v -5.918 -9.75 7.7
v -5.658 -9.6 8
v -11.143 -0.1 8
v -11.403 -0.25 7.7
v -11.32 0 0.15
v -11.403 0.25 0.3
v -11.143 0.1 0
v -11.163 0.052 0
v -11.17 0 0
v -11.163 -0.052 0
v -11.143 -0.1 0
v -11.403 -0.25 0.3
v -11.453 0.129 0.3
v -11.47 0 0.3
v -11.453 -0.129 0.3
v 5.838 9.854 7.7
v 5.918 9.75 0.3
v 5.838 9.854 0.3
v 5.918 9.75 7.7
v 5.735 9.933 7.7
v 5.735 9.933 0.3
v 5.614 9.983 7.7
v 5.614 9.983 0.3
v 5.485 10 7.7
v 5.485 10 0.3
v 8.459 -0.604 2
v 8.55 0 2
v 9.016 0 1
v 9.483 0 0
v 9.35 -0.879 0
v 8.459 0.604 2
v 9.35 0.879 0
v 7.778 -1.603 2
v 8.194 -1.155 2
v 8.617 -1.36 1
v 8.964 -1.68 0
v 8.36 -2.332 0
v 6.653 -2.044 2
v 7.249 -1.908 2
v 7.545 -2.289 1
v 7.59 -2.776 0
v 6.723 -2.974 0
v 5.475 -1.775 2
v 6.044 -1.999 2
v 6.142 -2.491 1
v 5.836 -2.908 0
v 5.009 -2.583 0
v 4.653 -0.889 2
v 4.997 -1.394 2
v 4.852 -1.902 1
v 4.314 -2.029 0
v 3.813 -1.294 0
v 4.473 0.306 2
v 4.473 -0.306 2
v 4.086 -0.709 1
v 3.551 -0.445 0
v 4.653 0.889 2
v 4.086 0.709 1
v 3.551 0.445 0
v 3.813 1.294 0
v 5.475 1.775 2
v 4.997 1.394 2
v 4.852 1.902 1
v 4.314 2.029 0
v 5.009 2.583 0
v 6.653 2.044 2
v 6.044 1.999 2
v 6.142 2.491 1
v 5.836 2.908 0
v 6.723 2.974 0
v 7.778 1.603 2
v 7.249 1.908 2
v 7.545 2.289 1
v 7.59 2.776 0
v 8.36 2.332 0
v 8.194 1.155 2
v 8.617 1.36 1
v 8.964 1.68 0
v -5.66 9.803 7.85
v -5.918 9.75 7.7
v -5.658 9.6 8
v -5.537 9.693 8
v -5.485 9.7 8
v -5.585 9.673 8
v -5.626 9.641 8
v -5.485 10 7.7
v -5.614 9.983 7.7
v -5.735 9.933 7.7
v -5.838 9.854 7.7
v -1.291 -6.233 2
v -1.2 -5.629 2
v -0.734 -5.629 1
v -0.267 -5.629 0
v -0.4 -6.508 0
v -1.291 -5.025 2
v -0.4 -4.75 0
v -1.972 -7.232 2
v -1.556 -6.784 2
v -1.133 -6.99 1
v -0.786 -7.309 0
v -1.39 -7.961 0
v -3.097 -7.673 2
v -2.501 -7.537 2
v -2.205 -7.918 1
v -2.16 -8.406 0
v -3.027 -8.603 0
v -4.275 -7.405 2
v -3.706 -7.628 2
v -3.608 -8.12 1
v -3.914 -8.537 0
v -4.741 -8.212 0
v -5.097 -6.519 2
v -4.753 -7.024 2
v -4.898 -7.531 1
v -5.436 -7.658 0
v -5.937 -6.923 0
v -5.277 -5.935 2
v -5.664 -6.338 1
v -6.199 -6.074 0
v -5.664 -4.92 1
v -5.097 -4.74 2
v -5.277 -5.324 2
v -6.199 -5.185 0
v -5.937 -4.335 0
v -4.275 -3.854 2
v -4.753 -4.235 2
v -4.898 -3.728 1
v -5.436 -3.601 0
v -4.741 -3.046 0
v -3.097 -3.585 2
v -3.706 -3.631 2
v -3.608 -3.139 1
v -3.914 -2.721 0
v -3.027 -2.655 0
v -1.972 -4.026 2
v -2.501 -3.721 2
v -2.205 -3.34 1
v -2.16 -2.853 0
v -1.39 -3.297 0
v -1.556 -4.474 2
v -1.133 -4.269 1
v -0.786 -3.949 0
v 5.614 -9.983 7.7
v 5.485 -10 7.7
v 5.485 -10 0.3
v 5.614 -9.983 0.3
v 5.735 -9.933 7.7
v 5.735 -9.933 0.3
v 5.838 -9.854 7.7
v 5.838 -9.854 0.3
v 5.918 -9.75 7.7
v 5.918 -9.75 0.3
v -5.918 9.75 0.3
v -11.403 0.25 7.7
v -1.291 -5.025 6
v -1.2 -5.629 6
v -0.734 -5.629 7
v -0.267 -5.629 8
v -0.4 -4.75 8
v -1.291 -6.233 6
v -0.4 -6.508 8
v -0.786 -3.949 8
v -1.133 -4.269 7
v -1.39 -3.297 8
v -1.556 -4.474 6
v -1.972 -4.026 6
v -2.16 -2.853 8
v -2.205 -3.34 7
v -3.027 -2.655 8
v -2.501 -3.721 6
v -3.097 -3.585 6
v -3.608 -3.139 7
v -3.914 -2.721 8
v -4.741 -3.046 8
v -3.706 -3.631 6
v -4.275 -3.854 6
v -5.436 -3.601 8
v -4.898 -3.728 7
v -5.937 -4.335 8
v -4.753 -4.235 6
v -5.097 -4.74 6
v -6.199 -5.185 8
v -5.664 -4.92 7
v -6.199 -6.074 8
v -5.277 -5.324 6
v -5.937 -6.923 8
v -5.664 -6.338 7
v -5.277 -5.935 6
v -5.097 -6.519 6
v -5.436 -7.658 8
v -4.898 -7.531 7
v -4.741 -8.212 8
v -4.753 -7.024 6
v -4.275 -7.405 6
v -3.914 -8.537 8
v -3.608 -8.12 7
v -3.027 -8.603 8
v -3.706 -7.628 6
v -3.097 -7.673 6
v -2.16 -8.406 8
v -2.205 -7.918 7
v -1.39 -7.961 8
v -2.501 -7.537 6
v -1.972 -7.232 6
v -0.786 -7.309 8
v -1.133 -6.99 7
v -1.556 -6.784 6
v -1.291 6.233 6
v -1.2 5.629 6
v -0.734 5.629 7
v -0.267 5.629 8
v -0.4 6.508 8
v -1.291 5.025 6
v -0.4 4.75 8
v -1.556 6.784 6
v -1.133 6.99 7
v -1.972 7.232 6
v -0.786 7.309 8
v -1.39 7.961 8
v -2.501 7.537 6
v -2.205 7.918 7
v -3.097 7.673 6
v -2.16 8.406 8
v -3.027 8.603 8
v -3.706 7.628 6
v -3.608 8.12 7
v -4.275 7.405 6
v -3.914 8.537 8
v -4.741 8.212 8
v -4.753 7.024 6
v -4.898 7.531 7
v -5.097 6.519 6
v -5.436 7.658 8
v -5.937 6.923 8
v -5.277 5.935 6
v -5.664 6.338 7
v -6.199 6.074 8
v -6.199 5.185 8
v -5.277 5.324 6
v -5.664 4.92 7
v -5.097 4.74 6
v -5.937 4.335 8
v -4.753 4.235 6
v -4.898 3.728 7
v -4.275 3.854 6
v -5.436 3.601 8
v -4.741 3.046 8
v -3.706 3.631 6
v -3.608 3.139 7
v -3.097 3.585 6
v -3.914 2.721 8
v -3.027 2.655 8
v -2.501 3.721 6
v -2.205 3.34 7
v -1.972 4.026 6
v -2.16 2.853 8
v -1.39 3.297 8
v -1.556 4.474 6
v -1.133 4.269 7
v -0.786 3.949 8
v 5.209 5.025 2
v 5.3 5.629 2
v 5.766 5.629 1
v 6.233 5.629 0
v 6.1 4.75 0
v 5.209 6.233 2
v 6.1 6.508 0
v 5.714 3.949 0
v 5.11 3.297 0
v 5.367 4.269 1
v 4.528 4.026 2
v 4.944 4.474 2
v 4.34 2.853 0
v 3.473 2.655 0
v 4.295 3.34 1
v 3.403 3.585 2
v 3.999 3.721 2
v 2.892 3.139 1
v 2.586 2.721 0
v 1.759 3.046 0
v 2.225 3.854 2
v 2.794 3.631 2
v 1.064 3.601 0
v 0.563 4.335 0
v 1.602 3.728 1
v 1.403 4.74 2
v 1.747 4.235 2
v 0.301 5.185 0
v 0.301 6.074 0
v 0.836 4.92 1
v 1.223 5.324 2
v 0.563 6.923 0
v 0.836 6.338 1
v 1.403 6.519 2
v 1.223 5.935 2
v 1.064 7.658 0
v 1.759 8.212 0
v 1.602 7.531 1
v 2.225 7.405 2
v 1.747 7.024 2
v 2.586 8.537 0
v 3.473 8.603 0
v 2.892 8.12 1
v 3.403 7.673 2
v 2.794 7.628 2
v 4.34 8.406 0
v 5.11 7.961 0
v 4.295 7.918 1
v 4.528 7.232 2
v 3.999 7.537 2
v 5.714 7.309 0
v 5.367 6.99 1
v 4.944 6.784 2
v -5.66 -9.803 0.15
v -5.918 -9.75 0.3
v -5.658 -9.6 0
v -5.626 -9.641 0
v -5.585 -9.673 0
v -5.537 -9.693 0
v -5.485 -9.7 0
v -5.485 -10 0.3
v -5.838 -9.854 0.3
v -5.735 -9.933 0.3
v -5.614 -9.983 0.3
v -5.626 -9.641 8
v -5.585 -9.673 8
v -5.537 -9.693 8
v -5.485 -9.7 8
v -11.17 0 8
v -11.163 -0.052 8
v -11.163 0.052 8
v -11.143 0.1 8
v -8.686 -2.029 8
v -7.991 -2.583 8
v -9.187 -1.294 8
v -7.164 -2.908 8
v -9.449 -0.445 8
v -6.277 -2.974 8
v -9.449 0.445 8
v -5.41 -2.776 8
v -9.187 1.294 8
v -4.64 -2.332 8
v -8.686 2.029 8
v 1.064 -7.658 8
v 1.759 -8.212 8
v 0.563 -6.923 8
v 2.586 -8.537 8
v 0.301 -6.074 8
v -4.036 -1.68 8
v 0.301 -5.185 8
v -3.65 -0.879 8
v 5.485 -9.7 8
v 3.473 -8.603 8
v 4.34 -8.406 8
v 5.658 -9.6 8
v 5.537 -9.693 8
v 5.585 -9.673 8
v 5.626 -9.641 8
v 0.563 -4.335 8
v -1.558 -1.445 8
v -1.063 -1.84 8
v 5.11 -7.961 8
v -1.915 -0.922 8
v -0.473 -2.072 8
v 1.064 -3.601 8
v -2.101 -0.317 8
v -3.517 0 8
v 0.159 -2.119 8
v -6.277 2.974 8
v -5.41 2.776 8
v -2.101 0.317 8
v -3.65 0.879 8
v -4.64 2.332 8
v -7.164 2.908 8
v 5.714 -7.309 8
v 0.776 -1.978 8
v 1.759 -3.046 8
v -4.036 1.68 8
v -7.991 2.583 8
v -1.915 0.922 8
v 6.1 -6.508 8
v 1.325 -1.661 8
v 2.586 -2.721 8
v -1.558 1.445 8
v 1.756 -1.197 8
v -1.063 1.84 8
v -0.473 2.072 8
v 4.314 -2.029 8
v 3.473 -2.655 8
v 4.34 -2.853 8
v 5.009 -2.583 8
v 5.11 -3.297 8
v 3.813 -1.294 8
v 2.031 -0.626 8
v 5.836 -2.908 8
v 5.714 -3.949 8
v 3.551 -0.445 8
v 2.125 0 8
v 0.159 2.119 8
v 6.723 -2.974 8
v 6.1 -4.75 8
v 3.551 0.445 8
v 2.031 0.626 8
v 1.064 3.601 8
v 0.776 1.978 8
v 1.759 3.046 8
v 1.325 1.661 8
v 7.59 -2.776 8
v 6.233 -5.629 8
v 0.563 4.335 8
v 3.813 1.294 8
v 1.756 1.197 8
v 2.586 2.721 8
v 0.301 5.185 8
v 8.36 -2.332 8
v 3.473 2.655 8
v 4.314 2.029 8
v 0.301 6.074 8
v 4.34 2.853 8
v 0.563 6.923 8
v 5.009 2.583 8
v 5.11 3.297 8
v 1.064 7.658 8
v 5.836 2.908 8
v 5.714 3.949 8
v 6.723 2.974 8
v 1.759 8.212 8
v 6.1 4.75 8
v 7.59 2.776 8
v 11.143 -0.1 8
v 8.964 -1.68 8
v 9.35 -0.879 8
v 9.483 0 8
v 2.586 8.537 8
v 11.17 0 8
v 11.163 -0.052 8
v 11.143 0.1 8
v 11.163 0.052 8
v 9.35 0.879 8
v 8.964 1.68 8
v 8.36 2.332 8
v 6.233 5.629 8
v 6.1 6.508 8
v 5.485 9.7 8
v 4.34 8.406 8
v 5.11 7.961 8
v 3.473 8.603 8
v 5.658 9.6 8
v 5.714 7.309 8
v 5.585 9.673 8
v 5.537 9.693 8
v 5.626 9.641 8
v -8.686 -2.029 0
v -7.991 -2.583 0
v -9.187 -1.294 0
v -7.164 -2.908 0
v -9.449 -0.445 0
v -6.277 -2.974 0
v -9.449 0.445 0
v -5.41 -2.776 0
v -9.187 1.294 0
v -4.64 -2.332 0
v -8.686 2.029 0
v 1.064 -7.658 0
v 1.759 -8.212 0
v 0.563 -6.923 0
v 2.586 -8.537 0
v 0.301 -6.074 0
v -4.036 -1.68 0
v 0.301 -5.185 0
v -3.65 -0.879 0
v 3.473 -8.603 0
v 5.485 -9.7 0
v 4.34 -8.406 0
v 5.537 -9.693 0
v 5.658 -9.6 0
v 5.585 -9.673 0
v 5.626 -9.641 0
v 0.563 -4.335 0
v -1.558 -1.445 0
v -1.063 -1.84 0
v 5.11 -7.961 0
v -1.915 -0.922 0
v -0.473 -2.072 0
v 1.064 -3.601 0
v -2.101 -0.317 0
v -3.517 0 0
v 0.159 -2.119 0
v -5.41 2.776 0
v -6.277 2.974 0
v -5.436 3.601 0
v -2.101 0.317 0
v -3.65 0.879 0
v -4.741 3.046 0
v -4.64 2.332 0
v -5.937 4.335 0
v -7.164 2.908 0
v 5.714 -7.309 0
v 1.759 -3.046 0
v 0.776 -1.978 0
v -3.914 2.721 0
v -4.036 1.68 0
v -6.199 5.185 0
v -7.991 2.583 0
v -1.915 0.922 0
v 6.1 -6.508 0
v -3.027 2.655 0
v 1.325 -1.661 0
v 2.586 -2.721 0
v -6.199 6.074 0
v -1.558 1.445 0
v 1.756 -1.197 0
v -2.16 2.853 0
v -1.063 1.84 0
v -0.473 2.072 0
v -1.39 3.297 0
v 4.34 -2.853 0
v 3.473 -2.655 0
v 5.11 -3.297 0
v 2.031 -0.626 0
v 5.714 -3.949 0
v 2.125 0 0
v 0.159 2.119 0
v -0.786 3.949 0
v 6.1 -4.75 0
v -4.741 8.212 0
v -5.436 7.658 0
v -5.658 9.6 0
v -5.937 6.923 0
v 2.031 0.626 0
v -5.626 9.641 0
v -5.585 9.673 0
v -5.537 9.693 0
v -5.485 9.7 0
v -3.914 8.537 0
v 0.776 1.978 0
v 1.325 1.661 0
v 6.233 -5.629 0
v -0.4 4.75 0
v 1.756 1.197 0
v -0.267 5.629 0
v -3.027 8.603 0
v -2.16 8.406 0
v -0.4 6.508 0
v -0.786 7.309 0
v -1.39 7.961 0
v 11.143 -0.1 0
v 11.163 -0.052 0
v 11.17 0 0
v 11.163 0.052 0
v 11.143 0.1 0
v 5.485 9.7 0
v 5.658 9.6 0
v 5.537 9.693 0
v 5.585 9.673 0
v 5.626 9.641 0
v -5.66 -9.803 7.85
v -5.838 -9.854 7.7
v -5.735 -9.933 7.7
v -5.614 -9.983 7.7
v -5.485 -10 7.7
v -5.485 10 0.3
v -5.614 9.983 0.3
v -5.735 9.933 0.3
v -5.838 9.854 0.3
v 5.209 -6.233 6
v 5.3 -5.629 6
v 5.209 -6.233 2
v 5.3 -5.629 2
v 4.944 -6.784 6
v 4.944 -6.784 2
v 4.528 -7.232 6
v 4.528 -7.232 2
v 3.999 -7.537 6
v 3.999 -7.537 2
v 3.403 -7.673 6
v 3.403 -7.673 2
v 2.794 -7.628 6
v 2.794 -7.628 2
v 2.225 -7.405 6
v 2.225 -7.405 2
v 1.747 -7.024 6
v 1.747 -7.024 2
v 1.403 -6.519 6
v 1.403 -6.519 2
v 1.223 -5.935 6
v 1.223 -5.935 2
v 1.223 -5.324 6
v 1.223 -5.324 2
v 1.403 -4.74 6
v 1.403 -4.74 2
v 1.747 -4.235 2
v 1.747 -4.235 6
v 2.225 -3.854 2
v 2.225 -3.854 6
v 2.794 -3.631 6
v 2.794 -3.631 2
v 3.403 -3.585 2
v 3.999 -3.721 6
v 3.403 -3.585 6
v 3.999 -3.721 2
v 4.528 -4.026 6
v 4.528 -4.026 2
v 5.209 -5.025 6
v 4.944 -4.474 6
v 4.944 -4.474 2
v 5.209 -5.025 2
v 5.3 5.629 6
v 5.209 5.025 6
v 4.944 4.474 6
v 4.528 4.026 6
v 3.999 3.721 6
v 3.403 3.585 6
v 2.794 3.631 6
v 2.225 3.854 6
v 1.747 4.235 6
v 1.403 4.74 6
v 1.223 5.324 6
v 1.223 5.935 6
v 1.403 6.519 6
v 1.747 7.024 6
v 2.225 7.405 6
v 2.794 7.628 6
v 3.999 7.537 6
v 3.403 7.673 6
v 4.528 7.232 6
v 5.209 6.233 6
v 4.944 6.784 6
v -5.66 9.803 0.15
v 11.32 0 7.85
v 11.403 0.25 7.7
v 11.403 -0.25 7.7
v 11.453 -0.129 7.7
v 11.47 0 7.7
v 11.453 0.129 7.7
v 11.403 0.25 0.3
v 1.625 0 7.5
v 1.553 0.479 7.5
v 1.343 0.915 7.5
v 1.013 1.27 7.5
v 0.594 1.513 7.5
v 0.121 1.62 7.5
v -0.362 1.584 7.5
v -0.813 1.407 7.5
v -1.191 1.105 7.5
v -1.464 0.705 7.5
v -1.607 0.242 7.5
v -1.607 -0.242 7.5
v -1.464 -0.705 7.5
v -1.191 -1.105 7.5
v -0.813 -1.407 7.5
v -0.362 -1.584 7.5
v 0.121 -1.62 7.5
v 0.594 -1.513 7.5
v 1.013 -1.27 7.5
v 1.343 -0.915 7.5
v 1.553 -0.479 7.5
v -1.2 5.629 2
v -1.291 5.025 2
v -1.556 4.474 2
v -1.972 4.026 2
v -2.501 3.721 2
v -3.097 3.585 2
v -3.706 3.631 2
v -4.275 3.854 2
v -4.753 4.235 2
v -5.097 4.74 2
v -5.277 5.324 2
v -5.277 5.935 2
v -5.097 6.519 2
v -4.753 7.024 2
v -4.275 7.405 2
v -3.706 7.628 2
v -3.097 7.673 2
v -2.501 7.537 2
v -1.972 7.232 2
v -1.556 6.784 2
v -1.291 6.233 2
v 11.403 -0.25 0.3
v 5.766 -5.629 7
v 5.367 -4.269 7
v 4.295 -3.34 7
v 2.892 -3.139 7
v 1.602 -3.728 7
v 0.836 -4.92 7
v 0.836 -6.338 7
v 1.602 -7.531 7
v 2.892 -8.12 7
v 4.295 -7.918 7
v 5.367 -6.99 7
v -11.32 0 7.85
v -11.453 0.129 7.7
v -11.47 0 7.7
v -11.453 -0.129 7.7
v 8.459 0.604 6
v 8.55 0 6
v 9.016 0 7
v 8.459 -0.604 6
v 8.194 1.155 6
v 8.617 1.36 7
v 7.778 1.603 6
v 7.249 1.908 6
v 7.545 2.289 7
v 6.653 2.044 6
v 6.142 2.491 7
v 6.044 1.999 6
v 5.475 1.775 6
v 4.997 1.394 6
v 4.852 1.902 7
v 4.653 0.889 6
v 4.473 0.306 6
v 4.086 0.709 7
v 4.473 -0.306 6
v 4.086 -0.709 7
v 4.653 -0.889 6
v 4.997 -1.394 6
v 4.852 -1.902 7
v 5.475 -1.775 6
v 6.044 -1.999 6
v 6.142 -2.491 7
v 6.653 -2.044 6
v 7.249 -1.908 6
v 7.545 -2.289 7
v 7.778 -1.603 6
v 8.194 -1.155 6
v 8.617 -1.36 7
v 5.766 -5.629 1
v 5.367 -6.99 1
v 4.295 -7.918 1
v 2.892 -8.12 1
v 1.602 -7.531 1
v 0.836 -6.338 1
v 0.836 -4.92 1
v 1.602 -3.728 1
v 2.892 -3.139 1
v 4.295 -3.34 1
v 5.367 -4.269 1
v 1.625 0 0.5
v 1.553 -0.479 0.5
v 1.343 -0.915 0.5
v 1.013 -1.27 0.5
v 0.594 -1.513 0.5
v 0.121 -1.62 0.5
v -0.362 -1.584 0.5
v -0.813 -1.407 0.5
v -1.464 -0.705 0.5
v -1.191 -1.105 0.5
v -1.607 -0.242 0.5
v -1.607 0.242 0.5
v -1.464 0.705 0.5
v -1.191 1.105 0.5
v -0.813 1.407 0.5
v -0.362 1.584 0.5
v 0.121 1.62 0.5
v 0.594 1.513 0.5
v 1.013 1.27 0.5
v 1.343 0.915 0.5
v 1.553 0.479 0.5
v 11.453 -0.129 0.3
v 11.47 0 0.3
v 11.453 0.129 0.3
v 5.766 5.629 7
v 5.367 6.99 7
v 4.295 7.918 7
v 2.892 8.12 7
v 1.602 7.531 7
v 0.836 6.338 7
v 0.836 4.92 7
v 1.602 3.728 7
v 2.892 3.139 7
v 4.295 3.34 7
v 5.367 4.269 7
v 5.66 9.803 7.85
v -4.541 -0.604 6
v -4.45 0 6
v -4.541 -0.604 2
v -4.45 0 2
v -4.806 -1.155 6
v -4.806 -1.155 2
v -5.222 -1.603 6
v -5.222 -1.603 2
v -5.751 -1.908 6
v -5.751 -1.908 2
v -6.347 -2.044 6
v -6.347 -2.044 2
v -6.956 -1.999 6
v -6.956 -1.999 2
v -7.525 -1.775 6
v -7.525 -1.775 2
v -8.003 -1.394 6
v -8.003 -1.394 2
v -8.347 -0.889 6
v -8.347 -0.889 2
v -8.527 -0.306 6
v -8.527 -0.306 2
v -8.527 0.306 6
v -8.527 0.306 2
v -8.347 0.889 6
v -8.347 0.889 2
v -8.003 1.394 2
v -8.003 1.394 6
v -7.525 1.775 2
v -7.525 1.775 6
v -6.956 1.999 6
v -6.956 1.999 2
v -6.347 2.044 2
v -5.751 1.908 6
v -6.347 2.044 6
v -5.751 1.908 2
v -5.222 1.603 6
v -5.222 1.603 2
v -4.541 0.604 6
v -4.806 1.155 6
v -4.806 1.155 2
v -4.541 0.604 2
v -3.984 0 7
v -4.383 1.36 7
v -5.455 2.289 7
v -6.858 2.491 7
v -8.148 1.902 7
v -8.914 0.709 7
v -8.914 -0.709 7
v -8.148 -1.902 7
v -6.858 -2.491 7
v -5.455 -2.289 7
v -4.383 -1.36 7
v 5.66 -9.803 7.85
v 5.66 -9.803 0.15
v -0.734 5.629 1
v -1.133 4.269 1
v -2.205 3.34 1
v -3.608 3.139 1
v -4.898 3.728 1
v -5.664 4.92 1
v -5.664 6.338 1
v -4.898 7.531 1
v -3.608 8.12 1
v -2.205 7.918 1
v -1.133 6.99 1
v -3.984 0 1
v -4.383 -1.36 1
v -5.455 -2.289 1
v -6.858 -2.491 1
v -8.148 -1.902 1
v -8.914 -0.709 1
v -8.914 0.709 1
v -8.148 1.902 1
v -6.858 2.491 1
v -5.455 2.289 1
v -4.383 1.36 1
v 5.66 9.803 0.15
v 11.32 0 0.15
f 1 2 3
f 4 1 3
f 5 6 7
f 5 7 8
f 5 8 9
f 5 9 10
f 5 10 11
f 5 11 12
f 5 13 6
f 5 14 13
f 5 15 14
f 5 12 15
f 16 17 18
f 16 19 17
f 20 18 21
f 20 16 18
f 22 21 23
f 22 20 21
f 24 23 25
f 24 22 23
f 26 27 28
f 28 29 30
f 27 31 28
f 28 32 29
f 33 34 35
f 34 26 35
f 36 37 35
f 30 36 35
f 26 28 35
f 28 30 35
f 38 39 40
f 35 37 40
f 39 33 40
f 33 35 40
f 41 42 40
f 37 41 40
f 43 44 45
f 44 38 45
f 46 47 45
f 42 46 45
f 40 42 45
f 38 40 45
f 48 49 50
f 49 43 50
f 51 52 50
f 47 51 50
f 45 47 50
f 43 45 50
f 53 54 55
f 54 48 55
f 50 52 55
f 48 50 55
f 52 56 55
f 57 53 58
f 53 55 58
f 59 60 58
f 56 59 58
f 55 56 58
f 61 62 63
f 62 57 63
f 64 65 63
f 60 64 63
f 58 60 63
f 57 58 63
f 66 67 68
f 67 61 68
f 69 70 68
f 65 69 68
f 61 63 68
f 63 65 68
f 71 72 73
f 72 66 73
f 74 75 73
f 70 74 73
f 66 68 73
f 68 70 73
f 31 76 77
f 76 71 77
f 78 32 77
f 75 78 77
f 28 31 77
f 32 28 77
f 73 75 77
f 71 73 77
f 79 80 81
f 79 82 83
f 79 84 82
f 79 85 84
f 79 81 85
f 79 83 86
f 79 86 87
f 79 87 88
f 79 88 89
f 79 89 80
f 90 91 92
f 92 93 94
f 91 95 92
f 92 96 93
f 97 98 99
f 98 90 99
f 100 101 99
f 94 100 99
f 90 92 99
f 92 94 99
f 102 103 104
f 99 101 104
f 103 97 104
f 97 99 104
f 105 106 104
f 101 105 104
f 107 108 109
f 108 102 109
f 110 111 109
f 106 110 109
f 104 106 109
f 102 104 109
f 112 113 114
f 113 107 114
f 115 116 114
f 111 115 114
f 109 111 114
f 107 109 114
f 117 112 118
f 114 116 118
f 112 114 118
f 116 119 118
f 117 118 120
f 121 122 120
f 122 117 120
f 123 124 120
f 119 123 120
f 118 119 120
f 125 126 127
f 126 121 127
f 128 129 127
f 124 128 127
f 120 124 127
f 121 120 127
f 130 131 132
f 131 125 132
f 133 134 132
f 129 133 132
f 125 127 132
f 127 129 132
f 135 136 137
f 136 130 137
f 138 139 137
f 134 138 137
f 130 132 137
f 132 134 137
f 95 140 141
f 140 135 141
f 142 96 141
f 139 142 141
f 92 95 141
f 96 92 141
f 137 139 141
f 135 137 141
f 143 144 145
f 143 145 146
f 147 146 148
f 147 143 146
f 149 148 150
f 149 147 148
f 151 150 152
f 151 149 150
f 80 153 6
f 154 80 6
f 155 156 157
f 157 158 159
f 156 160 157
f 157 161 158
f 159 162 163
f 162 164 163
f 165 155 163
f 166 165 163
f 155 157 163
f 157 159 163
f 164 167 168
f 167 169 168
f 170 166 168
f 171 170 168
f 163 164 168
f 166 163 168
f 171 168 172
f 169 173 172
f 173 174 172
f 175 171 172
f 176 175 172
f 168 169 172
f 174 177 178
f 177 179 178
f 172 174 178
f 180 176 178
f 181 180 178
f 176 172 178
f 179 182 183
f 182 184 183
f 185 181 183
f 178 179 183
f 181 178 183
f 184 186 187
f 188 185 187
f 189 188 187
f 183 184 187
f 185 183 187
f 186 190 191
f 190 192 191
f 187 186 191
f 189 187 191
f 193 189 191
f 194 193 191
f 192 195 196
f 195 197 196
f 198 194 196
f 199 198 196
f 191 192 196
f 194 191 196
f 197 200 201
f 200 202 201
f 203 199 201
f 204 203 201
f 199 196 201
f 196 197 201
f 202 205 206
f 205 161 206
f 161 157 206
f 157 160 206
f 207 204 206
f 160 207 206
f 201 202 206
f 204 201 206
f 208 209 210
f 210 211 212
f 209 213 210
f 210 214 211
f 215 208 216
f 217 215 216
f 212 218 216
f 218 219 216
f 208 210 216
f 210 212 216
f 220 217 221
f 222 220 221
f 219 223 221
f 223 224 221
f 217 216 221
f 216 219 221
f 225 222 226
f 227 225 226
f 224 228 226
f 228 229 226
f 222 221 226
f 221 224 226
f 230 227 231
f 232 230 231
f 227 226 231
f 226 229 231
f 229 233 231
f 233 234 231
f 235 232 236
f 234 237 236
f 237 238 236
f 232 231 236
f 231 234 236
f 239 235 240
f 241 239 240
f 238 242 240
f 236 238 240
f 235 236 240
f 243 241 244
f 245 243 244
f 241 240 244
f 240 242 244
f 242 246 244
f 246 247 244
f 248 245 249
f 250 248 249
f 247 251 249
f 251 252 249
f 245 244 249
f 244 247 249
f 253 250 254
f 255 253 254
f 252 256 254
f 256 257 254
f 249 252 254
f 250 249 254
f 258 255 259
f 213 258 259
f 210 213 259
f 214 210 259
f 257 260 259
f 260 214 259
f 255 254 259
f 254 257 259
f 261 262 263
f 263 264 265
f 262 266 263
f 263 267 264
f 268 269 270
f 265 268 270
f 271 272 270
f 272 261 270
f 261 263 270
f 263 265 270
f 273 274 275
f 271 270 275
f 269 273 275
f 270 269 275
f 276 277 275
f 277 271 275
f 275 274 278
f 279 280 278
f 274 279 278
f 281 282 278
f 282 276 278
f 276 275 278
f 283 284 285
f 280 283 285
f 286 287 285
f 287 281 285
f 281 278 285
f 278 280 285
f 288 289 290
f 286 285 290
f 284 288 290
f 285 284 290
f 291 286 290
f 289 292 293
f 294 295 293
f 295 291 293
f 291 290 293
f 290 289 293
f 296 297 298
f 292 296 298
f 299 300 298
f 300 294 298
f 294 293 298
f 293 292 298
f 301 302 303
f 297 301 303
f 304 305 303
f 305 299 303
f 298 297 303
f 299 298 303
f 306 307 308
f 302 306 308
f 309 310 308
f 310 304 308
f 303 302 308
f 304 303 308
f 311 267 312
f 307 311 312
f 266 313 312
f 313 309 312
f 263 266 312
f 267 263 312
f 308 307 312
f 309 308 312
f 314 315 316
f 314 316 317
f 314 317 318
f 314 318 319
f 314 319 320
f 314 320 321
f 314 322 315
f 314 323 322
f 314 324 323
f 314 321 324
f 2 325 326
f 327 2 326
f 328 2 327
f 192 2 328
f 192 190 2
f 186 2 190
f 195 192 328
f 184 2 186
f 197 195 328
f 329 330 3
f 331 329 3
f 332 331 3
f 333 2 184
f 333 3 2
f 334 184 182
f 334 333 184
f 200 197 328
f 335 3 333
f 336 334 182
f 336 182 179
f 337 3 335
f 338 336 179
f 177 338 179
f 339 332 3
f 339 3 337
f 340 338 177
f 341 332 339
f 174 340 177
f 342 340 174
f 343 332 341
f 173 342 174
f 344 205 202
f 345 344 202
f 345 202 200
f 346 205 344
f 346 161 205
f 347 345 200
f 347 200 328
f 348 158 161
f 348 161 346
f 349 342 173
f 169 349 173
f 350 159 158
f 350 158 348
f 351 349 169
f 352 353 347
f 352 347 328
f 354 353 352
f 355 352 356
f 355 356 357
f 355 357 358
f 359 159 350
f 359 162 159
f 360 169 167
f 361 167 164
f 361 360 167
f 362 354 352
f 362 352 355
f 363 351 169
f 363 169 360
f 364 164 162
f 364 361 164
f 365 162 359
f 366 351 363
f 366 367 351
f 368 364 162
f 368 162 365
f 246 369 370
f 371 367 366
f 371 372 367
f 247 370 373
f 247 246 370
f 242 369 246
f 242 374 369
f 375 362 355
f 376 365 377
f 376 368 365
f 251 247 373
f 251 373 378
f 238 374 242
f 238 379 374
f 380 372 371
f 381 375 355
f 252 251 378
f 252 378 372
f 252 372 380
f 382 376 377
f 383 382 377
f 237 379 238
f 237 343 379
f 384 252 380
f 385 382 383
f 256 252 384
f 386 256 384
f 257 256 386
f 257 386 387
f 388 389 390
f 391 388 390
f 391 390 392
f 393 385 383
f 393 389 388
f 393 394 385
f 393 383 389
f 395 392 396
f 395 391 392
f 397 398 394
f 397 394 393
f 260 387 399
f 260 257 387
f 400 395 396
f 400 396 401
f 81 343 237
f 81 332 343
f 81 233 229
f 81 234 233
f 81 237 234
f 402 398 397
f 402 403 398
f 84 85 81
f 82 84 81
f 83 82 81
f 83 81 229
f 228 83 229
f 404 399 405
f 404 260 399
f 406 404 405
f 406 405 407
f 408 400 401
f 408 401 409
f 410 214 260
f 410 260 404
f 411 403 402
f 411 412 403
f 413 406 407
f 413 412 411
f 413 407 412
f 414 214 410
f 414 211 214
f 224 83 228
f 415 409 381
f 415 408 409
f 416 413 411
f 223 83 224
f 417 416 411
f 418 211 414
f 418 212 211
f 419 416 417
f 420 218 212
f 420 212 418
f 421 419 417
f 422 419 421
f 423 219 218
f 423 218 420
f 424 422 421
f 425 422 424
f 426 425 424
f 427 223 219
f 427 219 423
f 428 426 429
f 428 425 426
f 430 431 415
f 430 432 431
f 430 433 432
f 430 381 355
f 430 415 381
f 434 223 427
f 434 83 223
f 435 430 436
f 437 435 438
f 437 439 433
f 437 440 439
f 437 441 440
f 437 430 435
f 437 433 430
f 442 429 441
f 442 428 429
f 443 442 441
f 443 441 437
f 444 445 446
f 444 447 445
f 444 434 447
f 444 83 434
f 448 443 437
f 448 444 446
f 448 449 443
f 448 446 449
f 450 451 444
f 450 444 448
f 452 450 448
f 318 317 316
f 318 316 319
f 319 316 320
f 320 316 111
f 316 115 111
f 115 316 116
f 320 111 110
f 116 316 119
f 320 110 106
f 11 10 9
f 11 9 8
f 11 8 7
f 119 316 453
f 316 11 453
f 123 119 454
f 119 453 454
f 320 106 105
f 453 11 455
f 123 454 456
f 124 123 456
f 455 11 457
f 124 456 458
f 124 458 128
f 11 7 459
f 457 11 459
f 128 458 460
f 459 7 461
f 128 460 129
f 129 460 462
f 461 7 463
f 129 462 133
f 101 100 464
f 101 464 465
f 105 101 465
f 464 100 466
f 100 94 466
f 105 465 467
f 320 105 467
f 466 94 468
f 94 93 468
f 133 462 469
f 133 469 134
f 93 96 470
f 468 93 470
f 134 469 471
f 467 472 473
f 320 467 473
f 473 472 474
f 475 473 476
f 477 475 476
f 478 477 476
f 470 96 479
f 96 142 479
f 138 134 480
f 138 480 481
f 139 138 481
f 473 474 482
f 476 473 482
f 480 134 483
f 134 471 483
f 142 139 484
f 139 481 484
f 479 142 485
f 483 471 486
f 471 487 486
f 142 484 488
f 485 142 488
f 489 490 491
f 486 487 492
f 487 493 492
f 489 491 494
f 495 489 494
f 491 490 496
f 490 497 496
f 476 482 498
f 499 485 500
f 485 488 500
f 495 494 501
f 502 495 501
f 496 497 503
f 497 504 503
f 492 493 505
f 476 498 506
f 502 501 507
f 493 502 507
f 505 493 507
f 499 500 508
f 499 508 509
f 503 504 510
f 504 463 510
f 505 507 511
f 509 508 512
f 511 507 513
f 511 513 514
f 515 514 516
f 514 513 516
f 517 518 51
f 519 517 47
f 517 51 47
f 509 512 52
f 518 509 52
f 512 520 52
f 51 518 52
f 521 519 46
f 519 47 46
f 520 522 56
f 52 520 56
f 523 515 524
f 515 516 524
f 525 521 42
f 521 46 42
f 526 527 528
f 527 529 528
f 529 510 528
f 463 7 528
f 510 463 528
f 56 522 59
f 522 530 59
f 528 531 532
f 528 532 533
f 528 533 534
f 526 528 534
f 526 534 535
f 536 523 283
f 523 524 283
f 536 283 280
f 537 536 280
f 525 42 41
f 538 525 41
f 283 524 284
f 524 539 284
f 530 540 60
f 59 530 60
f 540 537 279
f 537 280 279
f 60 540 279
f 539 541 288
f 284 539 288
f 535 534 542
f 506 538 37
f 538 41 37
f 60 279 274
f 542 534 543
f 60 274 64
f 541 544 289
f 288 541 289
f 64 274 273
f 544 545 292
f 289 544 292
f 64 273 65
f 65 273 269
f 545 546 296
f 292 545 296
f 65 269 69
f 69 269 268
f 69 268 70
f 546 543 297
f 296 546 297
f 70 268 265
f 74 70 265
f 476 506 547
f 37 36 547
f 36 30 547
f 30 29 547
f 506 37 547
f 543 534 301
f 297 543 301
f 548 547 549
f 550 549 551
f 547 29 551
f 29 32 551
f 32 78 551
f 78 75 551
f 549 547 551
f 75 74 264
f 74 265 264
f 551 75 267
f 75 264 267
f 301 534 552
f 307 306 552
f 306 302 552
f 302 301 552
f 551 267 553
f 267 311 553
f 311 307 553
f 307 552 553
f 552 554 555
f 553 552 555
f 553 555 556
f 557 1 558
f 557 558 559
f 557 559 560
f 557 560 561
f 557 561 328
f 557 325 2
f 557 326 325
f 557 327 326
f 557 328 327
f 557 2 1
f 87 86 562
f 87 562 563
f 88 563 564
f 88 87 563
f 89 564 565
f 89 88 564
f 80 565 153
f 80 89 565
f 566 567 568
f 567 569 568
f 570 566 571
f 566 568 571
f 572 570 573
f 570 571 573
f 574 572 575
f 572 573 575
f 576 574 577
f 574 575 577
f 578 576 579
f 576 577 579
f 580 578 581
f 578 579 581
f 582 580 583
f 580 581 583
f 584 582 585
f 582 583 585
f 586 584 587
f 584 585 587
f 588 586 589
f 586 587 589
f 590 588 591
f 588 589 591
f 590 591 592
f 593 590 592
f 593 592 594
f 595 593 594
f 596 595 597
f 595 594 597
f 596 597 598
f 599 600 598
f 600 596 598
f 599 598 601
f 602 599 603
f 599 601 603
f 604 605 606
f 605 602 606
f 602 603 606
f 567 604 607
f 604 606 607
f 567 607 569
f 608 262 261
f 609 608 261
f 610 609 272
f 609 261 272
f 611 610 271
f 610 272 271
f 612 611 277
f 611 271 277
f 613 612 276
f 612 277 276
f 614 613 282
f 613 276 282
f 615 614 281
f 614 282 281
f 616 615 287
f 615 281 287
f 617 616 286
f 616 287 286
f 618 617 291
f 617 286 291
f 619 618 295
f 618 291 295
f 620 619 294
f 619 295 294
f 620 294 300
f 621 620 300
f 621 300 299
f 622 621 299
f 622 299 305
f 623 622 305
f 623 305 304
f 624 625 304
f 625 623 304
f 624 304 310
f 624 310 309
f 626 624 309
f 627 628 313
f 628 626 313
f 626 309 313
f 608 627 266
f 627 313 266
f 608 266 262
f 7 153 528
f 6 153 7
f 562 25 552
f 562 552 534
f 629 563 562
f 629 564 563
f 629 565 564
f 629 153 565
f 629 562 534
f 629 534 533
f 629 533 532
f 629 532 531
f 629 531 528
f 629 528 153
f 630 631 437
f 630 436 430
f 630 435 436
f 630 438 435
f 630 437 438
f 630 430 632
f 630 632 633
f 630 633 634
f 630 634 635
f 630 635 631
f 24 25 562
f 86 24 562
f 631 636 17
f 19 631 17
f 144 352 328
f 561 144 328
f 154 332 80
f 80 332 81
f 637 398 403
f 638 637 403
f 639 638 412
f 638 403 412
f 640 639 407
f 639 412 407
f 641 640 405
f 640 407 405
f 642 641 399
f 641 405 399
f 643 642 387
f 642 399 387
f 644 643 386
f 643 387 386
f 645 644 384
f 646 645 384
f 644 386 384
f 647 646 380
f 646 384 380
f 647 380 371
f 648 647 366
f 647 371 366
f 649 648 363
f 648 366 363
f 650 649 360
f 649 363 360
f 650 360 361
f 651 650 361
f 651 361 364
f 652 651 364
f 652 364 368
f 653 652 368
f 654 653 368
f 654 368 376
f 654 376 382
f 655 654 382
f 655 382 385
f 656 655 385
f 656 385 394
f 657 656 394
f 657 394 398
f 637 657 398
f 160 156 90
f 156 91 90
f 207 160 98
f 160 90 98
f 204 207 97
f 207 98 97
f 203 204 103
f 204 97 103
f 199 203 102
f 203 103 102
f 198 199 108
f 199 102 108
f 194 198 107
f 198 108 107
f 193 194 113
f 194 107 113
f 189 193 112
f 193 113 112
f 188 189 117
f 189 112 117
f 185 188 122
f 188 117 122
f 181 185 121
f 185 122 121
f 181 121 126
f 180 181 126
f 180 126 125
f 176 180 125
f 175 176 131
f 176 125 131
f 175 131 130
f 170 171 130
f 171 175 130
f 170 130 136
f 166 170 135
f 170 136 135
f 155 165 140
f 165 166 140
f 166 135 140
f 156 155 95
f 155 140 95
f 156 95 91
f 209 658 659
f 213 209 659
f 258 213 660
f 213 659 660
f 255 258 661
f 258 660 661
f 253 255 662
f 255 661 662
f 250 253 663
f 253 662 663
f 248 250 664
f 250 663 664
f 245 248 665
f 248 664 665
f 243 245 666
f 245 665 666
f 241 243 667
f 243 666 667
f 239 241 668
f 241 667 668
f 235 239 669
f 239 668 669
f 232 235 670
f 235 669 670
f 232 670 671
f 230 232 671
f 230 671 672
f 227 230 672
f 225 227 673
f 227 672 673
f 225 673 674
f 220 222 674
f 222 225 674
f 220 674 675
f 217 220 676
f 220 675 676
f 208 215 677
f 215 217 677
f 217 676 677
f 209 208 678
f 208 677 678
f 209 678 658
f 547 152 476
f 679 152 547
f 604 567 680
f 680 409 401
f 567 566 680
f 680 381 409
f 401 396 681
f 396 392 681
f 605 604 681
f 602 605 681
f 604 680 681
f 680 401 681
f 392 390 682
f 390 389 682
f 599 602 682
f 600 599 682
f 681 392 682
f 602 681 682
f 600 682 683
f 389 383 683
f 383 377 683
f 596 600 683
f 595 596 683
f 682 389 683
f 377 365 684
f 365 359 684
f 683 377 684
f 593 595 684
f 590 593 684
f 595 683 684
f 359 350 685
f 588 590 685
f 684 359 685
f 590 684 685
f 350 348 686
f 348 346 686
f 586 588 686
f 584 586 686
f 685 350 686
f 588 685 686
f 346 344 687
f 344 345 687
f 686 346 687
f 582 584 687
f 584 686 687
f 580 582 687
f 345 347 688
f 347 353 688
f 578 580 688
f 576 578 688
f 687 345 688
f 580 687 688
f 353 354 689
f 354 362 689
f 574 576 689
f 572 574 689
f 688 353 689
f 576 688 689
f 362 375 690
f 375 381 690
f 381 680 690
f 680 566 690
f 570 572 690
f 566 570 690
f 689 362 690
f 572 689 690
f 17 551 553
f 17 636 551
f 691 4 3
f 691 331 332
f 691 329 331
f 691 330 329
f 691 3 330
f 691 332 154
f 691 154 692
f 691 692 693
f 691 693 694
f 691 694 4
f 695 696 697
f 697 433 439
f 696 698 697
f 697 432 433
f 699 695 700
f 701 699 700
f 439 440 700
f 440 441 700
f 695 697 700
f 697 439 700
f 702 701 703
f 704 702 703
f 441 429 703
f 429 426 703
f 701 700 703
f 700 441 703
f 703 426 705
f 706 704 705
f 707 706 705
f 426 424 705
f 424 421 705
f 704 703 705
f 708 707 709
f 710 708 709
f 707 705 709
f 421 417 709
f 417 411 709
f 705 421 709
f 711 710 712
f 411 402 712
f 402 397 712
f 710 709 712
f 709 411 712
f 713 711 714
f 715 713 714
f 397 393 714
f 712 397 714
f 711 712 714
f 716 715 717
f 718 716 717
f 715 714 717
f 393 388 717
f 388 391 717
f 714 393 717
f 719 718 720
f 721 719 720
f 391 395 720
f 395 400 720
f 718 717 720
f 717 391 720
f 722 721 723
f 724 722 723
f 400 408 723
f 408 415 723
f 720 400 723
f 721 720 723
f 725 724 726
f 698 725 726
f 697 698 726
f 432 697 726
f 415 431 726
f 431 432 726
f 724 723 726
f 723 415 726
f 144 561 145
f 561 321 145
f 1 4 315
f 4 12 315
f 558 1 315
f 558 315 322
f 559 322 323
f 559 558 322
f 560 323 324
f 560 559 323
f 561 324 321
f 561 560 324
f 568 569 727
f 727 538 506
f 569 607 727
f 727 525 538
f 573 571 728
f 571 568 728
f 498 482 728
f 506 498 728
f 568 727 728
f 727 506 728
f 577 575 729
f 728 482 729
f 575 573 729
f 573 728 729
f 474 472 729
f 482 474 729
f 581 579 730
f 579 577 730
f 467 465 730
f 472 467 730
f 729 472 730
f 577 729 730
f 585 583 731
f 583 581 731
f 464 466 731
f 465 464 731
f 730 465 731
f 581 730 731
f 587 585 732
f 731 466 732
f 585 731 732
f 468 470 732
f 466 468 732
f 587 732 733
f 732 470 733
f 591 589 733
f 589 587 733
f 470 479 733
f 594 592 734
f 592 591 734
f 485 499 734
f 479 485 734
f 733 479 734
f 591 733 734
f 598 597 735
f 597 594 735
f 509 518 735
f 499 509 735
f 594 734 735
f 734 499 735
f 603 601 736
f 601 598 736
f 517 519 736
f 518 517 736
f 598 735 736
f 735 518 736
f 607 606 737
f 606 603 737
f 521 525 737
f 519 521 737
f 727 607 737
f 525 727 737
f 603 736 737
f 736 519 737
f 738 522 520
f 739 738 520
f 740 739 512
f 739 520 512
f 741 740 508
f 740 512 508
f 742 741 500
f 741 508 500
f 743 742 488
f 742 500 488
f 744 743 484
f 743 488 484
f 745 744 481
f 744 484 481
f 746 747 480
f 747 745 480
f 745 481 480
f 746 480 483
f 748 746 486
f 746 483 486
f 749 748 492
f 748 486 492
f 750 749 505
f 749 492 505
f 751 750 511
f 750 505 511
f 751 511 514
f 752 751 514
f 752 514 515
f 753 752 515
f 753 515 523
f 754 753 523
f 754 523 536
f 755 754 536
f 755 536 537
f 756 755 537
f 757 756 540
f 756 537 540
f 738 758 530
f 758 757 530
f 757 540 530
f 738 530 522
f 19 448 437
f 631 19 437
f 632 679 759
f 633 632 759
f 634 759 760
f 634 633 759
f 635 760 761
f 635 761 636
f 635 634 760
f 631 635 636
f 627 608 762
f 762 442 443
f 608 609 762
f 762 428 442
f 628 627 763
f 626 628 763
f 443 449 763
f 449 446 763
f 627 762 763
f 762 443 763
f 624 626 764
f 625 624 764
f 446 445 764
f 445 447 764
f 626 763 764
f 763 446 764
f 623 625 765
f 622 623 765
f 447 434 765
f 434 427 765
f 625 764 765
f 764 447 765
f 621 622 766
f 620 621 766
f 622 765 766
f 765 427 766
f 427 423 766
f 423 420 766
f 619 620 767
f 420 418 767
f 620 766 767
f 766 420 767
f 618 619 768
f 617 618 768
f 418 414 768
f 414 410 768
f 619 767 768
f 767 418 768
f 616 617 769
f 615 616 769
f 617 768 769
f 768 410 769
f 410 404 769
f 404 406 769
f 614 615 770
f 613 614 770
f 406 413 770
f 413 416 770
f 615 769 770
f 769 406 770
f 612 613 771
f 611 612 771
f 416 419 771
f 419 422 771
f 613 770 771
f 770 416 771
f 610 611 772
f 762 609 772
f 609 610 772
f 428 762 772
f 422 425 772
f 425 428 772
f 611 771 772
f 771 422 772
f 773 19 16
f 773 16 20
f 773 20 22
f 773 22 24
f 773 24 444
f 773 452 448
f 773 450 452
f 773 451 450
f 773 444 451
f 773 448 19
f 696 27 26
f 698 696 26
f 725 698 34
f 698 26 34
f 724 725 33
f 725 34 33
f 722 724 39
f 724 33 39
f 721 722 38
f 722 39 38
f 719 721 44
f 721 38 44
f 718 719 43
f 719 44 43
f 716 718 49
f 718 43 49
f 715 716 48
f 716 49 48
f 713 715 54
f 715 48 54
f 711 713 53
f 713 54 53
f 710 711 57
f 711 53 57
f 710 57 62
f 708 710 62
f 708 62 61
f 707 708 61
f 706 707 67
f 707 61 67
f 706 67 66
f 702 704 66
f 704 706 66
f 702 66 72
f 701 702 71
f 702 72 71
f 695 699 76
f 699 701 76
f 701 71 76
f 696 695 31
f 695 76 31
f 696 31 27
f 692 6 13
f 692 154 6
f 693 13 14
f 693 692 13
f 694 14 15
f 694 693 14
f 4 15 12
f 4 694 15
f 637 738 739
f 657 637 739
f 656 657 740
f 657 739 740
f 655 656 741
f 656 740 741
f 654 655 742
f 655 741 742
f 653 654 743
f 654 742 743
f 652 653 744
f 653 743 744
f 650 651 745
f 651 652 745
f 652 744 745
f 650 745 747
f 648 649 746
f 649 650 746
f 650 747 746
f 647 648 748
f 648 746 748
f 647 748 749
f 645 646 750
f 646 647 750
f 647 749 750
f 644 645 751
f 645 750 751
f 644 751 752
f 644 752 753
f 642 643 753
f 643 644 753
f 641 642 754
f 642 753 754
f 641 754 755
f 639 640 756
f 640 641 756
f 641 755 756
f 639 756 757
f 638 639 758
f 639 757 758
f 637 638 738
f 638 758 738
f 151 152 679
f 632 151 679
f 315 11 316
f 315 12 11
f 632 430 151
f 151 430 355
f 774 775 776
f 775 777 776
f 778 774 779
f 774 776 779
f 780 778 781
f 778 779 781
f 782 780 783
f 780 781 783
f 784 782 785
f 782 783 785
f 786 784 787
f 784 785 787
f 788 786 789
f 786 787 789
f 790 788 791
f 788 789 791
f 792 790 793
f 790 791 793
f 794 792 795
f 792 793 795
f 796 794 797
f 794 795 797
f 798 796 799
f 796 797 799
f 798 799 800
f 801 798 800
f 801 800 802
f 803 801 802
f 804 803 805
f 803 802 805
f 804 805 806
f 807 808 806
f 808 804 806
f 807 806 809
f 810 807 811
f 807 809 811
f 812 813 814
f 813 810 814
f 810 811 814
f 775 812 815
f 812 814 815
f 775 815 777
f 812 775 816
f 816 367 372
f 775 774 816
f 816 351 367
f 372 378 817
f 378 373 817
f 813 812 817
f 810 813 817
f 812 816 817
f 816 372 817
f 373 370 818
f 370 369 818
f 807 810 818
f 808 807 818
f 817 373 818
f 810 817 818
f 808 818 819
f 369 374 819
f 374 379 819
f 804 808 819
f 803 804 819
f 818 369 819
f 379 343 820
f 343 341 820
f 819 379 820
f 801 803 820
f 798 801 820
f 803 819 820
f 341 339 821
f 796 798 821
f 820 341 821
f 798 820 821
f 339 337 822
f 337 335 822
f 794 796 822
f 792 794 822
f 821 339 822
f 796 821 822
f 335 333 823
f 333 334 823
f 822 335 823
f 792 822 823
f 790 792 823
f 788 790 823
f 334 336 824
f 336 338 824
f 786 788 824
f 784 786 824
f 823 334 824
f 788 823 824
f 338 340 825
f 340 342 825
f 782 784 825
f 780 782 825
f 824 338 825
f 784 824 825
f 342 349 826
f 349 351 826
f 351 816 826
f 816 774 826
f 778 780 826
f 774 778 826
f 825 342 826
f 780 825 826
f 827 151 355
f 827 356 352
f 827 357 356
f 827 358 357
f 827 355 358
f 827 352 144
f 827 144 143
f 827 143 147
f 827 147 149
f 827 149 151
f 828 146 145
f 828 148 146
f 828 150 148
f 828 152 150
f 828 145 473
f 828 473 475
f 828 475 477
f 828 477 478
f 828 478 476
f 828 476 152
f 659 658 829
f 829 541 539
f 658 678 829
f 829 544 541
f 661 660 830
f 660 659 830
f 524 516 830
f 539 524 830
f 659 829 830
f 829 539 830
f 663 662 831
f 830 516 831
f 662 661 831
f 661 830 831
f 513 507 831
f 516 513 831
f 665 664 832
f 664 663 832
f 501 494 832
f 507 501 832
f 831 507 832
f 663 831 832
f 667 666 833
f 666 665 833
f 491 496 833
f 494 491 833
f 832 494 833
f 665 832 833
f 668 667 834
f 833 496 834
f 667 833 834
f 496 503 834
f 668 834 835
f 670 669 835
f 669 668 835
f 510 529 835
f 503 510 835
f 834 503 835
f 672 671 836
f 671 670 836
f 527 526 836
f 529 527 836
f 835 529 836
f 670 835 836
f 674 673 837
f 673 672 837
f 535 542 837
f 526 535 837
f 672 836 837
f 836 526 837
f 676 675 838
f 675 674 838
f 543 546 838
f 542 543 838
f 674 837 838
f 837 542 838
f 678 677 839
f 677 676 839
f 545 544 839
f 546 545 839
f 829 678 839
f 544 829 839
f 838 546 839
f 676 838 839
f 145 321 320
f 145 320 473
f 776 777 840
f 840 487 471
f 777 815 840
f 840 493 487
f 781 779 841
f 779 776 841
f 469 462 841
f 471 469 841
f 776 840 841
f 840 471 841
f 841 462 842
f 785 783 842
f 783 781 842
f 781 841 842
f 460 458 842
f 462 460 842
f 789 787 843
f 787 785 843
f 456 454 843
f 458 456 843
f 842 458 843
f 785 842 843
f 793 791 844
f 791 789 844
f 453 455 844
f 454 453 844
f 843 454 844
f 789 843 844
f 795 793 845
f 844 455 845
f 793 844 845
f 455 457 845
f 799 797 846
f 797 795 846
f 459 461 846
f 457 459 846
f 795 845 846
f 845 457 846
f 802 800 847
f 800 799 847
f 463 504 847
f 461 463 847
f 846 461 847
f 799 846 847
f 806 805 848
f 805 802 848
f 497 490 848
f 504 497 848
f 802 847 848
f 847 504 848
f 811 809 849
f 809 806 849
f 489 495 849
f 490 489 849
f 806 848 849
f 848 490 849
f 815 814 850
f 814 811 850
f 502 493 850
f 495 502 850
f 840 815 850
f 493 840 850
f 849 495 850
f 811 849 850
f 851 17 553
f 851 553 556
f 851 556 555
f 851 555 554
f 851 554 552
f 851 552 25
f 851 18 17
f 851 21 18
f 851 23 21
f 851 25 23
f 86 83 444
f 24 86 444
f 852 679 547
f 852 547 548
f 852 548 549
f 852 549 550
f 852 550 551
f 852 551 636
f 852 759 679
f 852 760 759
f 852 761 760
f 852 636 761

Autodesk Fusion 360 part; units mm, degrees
sketch "Sketch1" plane through (0, 0, 0) normal (0, 0, 1) x (1, 0, 0)
  line L0 (-5.7735, 10) -> (-11.547, 0)
  line L1 (-11.547, 0) -> (-5.7735, -10)
  line L2 (-5.7735, -10) -> (5.7735, -10)
  line L3 (5.7735, -10) -> (11.547, 0)
  line L4 (11.547, 0) -> (5.7735, 10)
  line L5 (5.7735, 10) -> (-5.7735, 10)
  circle A0 centre (0, 0) radius 1.625
  circle A1 centre (-3.25, 5.6292) radius 2.05
  line L6 (0, 0) -> (-5.7735, 10) construction
  circle A2 centre (-6.5, 0) radius 2.05
  circle A3 centre (-3.25, -5.6292) radius 2.05
  circle A4 centre (3.25, -5.6292) radius 2.05
  circle A5 centre (6.5, 0) radius 2.05
  circle A6 centre (3.25, 5.6292) radius 2.05
  circle A7 centre (0, 0) radius 6.5 construction
  dimension "d1" = 10
  dimension "d2" = 3.25
  dimension "d4" = 4.1
  dimension "d9" = 360
  dimension "d10" = 13
extrude "Extrude1" add sketch "Sketch1" along normal blind 8
chamfer "Chamfer3" distance 0.5 angle 45 1 edges at (-1.515, 0.5876, 0)
chamfer "Chamfer3" distance 0.5 angle 45 1 edges at (-1.515, 0.5876, 8)
fillet "Fillet1" radius 0.5 6 edges at (-5.7735, -10, 4) (5.7735, -10, 4) (11.547, 0, 4) (5.7735, 10, 4) (-5.7735, 10, 4) (-11.547, 0, 4)
chamfer "Chamfer4" distance 0.3 angle 45 24 edges at (0, -10, 8) (5.7348, -9.933, 8) (8.6603, -5, 8) (11.4697, 0, 8) (8.6603, 5, 8) (5.7348, 9.933, 8) (0, 10, 8) (-5.7348, 9.933, 8) (-8.6603, 5, 8) (-11.4697, 0, 8) (-8.6603, -5, 8) (-5.7348, -9.933, 8) (0, -10, 0) (5.7348, -9.933, 0) (8.6603, -5, 0) (11.4697, 0, 0) (8.6603, 5, 0) (5.7348, 9.933, 0) (0, 10, 0) (-5.7348, 9.933, 0) (-8.6603, 5, 0) (-11.4697, 0, 0) (-8.6603, -5, 0) (-5.7348, -9.933, 0)
chamfer "Chamfer2" distance 2 angle 25 6 edges at (1.3387, 6.3705, 8) (-5.1613, 6.3705, 8) (-8.4113, 0.7413, 8) (-5.1613, -4.8879, 8) (1.3387, -4.8879, 8) (4.5887, 0.7413, 8) measured on face at (5.2975, 5.527, 5.3333) measured on face at (-1.2025, 5.527, 5.3333) measured on face at (-4.4525, -0.1022, 5.3333) measured on face at (-1.2025, -5.7313, 5.3333) measured on face at (5.2975, -5.7313, 5.3333) measured on face at (8.5475, -0.1022, 5.3333)
chamfer "Chamfer5" distance 2 angle 25 6 edges at (-5.1613, -4.8879, 0) (1.3387, -4.8879, 0) (4.5887, 0.7413, 0) (1.3387, 6.3705, 0) (-5.1613, 6.3705, 0) (-8.4113, 0.7413, 0) measured on face at (-1.2102, -5.8333, 2) measured on face at (5.2898, -5.8333, 2) measured on face at (8.5398, -0.2041, 2) measured on face at (5.2898, 5.4251, 2) measured on face at (-1.2102, 5.4251, 2) measured on face at (-4.4602, -0.2041, 2)
